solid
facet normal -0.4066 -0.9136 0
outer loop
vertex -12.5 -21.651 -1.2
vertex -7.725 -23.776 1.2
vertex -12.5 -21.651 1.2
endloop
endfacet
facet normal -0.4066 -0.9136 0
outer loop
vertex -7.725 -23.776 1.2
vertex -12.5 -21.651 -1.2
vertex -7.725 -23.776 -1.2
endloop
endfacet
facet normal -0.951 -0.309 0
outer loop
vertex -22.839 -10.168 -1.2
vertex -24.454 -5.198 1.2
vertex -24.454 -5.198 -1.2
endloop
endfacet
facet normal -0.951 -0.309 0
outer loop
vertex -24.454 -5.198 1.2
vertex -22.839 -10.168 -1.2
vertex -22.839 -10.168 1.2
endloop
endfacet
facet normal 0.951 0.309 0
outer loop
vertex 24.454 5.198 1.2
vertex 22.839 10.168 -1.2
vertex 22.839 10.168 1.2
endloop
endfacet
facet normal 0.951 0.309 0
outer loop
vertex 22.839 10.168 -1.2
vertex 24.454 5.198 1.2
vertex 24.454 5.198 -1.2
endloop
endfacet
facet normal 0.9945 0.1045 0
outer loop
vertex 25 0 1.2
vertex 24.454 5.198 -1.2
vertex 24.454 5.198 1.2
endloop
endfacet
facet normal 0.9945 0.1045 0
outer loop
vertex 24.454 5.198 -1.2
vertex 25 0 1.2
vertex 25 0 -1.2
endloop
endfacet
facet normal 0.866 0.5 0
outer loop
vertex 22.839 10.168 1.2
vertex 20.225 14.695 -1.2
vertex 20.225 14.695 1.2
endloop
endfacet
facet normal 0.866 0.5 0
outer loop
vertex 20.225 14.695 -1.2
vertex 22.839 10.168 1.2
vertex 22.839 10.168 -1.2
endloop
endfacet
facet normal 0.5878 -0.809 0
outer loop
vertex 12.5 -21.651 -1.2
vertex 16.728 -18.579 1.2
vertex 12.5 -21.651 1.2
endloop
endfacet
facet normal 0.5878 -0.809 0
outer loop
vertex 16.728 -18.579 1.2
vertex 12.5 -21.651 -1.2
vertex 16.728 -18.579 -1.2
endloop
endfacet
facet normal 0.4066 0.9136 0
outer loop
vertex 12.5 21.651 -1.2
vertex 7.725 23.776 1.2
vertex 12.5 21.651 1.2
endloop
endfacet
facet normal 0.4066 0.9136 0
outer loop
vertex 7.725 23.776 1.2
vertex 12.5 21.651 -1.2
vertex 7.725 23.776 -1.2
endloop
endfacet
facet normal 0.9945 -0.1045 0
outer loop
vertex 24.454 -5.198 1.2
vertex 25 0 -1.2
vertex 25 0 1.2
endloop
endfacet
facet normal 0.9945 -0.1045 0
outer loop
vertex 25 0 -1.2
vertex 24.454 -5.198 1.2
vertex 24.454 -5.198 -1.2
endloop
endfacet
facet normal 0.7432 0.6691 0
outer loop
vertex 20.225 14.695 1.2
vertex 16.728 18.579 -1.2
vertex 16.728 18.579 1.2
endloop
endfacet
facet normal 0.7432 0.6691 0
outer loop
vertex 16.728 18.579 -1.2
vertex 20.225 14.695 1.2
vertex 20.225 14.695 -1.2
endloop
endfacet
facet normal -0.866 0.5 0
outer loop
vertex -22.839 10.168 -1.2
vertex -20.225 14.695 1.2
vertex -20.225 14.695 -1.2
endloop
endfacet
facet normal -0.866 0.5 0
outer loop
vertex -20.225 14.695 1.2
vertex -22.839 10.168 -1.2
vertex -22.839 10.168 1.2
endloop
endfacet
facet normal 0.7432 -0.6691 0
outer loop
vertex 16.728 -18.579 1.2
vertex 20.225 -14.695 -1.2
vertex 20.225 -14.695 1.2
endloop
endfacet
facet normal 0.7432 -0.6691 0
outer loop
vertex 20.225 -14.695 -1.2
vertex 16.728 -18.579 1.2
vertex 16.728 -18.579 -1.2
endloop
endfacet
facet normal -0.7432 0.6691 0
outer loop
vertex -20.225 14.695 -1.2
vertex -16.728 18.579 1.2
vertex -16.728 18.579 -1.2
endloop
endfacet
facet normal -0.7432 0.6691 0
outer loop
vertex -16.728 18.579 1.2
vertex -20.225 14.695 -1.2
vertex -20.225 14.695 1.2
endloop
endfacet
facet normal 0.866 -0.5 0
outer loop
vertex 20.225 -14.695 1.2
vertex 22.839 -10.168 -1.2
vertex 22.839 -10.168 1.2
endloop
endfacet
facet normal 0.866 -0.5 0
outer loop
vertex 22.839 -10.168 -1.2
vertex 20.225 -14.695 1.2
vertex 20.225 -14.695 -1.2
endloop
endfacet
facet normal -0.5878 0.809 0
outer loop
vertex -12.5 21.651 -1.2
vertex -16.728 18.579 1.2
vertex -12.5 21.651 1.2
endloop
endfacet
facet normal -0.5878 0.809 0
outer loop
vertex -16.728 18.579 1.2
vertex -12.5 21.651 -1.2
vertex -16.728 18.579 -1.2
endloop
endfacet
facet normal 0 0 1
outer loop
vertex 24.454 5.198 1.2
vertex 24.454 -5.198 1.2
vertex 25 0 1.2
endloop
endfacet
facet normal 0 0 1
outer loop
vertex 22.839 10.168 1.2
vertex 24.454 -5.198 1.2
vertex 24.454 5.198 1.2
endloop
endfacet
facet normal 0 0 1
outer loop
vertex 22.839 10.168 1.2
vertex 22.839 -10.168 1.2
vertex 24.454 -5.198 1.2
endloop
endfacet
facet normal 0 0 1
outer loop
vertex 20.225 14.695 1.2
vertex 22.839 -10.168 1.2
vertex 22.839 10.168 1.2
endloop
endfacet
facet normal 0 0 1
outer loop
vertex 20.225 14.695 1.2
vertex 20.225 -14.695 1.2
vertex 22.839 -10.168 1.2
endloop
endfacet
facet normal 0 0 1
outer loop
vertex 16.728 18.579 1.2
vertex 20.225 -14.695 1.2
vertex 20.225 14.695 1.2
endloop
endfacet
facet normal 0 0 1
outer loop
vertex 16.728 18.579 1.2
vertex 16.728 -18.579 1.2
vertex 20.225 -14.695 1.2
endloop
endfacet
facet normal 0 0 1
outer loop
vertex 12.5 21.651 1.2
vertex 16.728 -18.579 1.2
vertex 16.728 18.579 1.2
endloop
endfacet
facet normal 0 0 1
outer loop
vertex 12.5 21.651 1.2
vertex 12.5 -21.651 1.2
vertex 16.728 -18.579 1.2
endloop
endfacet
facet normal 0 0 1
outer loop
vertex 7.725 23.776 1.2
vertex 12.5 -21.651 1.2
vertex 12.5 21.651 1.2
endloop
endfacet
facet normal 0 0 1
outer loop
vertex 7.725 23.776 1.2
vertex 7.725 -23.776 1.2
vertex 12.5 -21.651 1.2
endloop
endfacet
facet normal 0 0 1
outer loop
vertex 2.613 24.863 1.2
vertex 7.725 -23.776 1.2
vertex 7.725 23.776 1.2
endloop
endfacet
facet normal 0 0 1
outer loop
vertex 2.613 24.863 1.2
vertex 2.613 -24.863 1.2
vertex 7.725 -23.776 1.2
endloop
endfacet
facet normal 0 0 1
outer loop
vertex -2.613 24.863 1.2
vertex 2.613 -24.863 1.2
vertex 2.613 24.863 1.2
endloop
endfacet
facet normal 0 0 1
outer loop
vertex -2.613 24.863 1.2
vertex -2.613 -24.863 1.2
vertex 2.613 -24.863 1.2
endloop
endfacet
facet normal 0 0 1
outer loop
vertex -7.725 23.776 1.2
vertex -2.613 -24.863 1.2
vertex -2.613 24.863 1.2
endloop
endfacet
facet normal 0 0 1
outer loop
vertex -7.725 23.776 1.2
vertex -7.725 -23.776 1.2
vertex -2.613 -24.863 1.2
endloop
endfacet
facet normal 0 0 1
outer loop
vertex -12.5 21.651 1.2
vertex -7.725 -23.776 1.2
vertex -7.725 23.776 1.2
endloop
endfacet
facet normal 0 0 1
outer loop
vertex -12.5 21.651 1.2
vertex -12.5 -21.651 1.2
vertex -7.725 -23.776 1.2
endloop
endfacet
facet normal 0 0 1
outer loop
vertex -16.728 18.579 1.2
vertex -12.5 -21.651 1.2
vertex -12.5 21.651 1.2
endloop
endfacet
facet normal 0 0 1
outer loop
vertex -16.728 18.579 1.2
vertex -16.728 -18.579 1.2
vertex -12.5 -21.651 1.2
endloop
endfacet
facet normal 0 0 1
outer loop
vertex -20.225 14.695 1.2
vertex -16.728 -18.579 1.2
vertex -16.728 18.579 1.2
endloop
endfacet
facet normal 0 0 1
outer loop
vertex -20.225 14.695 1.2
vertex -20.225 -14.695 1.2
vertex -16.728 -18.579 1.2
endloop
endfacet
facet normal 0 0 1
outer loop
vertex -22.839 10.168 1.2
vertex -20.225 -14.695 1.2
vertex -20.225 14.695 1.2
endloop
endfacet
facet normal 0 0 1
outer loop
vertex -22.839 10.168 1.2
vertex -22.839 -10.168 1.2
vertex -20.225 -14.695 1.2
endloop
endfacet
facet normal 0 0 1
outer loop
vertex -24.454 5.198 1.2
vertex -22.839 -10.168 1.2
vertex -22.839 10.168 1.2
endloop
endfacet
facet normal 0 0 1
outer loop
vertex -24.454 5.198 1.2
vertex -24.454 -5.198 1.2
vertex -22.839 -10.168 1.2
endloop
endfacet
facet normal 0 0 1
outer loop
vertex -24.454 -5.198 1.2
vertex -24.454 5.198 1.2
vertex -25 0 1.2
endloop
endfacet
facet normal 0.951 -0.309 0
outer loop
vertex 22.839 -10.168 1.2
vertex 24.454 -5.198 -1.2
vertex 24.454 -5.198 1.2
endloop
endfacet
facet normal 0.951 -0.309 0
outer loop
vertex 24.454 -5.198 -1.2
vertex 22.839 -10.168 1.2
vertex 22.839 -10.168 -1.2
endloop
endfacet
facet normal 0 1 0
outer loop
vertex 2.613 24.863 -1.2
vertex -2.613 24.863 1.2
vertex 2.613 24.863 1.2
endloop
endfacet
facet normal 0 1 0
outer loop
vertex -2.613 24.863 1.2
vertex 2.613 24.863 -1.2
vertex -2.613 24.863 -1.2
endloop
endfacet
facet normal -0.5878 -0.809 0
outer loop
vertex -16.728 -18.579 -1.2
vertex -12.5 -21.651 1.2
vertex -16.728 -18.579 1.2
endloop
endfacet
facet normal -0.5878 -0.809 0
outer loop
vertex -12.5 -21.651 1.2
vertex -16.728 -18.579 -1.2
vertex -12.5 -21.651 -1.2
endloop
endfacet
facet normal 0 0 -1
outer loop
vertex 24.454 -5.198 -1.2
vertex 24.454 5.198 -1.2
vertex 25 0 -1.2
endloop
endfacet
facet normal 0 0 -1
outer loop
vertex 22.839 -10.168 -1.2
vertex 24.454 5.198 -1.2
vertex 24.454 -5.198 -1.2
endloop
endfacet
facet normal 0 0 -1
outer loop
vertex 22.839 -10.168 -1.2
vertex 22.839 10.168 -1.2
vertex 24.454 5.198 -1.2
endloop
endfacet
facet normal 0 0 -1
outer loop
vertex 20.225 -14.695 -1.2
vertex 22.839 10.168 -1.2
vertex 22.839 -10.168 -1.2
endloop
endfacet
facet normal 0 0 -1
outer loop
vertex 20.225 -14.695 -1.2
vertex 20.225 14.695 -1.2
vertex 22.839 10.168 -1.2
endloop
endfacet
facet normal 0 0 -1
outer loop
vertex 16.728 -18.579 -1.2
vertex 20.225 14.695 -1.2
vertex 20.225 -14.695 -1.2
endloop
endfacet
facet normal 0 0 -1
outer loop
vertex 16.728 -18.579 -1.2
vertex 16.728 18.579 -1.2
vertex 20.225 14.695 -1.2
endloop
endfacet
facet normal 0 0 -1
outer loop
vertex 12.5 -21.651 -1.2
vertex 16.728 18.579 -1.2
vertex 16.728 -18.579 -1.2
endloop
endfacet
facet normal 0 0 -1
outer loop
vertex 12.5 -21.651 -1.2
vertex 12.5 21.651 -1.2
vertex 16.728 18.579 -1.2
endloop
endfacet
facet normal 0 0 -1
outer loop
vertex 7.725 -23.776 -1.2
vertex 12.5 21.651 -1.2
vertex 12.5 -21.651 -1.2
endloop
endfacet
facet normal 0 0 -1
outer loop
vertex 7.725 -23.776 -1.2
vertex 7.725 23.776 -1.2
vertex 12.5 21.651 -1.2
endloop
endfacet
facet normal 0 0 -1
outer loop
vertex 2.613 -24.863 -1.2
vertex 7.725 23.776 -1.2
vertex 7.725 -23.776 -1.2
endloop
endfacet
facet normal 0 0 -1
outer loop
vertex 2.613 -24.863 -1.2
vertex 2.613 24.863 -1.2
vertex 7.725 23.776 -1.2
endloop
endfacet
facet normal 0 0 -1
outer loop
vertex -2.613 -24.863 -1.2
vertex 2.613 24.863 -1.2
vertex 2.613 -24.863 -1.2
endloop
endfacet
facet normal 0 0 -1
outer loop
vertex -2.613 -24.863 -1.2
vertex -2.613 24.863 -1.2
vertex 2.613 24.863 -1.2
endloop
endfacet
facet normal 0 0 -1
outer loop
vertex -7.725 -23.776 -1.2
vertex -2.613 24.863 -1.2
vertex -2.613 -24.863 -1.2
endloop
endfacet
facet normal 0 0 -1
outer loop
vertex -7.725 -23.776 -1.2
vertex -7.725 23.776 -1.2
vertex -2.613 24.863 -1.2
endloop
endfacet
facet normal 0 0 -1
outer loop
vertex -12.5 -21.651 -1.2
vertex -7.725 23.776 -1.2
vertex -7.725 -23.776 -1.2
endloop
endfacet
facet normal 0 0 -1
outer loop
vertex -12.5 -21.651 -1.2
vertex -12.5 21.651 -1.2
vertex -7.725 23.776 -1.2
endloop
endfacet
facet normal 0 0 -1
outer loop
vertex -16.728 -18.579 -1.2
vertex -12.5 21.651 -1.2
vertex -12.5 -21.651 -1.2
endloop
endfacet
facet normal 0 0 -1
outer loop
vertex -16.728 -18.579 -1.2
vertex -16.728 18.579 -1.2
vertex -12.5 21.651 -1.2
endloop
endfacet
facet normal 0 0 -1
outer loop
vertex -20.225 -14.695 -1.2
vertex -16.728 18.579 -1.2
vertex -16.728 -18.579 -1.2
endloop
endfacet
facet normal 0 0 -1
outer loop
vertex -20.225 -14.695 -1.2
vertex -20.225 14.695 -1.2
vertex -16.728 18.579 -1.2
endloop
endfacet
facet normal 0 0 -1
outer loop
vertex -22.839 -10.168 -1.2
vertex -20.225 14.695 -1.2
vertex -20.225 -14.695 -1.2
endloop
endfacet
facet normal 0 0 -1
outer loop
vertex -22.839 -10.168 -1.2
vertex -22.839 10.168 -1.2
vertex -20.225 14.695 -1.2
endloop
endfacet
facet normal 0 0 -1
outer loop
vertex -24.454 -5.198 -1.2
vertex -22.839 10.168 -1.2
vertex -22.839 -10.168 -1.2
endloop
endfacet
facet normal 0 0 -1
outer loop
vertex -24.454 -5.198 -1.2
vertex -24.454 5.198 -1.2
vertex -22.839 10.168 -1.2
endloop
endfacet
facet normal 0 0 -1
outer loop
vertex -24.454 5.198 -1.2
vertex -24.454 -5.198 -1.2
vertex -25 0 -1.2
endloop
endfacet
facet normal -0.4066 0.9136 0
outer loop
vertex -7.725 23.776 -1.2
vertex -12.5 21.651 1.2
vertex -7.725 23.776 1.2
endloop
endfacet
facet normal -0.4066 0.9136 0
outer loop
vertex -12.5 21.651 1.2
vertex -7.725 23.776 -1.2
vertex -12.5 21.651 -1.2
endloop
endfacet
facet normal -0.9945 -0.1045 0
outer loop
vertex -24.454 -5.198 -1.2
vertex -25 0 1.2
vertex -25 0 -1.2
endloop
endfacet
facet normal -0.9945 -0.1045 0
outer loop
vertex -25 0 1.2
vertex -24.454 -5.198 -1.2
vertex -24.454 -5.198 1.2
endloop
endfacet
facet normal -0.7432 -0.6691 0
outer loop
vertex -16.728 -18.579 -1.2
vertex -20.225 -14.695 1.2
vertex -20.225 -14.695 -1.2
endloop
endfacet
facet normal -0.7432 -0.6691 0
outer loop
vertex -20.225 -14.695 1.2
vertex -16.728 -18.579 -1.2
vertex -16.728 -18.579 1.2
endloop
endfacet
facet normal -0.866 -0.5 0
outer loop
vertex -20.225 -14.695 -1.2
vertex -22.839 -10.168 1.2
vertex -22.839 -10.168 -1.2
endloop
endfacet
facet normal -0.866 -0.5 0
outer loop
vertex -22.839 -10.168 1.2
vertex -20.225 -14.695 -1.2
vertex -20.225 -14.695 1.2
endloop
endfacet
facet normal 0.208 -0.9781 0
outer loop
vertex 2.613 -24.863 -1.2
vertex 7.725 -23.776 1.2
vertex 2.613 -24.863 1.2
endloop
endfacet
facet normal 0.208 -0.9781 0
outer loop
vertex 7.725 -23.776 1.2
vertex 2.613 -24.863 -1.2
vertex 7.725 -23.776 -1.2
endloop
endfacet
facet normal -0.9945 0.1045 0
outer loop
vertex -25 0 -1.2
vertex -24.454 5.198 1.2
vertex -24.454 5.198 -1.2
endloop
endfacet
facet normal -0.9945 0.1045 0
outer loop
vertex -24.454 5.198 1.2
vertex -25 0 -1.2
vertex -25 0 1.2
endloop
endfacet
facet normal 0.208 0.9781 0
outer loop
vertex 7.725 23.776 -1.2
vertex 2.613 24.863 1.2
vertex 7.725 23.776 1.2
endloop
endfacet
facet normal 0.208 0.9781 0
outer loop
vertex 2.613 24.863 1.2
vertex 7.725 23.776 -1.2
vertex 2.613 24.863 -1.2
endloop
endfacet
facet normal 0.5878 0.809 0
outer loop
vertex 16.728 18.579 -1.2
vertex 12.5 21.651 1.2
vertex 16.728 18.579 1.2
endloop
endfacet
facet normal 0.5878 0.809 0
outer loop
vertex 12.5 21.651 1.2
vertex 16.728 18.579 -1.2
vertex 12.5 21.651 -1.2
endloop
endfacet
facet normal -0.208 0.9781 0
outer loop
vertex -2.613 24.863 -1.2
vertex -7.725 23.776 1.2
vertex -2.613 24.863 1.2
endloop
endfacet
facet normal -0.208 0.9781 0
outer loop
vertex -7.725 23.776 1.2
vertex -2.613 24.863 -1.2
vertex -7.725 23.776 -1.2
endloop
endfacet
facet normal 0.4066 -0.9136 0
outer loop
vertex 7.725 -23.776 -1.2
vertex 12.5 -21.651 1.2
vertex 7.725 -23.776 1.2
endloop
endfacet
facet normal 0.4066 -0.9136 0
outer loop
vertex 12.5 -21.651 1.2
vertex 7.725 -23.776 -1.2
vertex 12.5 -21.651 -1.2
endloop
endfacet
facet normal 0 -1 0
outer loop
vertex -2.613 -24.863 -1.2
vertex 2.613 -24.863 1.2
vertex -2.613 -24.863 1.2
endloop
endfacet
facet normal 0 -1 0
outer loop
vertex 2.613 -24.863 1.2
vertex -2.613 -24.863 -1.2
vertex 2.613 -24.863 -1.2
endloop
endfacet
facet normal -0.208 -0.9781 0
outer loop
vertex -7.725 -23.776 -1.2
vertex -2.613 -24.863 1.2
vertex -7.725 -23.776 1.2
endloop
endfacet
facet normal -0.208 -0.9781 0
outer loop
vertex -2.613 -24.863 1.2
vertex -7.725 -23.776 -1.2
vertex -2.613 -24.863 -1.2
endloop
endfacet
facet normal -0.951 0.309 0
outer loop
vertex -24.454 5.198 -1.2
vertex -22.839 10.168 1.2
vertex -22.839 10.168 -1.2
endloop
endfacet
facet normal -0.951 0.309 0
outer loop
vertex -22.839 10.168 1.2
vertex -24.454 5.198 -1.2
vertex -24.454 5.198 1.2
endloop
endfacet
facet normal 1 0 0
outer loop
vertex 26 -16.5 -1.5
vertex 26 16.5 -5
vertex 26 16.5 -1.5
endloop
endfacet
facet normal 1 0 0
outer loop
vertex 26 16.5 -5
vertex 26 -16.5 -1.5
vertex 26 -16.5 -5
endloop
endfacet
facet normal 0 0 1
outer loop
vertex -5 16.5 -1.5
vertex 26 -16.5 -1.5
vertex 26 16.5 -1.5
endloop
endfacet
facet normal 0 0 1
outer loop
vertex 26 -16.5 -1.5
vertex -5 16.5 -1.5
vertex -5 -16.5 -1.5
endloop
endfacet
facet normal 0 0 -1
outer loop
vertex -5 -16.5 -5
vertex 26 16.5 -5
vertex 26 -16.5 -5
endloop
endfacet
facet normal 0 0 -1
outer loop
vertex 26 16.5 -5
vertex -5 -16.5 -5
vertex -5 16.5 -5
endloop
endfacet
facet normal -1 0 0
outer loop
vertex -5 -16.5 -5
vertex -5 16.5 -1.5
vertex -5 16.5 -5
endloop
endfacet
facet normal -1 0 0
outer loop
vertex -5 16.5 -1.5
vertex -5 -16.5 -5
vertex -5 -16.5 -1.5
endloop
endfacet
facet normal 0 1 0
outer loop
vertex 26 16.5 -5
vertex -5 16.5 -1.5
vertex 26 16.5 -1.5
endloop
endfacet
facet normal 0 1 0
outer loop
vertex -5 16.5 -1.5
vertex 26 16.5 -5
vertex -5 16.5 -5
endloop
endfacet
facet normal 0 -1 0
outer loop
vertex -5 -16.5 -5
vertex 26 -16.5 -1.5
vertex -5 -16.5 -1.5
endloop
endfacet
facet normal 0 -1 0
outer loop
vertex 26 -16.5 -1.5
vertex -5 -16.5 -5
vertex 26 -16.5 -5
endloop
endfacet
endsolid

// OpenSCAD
// file: sender.scad
module sender(){
    coilRadius = 25;
    coilHeight = 2.4;
    chipLength = 31;
    chipDepth = 33;
    chipHeight = 3.5;
    chip_coil_spacing = 10;
    chipDimensions = [chipLength, chipDepth, chipHeight];
    cylinder(coilHeight, coilRadius, coilRadius, true);
    translate([-5, -16.5, -5]){
        cube(chipDimensions);
    }
}

sender();
// file: receiver.scad
module receiver(){
    //CoilDimensions
    coilLength = 41;
    coilDepth = 29;
    coilHeight = 0.3;
    coilDimensions = [coilLength, coilDepth, coilHeight];
    //CoilHoleDimensions
    coilHoleLength = 23;
    coilHoleDepth = 10;
    coilHoleHeight = 2 * coilHeight;
    coilHoleDimensions = [coilHoleLength, coilHoleDepth, coilHoleHeight];
    //ChipDimensions
    chipLength = 19;
    chipDepth = 32.5;
    chipHeight = 1.1;
    chipDimensions = [chipLength, chipDepth, chipHeight];
    
    coil_chip_spacing = 3;
    module receiverCoil(coilDimensions, coilHoleDimensions){
        difference(){
            cube(coilDimensions);
            trans = [(coilDimensions.x - coilHoleDimensions.x) / 2,
            (coilDimensions.y - coilHoleDimensions.y) / 2,
            -(coilHoleDimensions.z - coilDimensions.z) / 2];
            translate(trans){
                color([1.0, 0.0, 0.0, 1.0]){
                    cube(coilHoleDimensions);
                }
            }
        }
    }
    center = [chipLength + coil_chip_spacing,
    0, 0];
    translate(center){
        receiverCoil(coilDimensions, coilHoleDimensions);
        trans = [-coil_chip_spacing - chipLength,
        -(chipDepth - coilDepth) / 2,
        -(chipHeight - coilHeight) / 2];
        translate(trans){
            cube(chipDimensions);
        }
    }
}

receiver();
// main file
use <receiver.scad>
use <sender.scad>

translate([0, 0, 20]){
    //topcover();
}

//receiver();
sender();
//baseplate();
